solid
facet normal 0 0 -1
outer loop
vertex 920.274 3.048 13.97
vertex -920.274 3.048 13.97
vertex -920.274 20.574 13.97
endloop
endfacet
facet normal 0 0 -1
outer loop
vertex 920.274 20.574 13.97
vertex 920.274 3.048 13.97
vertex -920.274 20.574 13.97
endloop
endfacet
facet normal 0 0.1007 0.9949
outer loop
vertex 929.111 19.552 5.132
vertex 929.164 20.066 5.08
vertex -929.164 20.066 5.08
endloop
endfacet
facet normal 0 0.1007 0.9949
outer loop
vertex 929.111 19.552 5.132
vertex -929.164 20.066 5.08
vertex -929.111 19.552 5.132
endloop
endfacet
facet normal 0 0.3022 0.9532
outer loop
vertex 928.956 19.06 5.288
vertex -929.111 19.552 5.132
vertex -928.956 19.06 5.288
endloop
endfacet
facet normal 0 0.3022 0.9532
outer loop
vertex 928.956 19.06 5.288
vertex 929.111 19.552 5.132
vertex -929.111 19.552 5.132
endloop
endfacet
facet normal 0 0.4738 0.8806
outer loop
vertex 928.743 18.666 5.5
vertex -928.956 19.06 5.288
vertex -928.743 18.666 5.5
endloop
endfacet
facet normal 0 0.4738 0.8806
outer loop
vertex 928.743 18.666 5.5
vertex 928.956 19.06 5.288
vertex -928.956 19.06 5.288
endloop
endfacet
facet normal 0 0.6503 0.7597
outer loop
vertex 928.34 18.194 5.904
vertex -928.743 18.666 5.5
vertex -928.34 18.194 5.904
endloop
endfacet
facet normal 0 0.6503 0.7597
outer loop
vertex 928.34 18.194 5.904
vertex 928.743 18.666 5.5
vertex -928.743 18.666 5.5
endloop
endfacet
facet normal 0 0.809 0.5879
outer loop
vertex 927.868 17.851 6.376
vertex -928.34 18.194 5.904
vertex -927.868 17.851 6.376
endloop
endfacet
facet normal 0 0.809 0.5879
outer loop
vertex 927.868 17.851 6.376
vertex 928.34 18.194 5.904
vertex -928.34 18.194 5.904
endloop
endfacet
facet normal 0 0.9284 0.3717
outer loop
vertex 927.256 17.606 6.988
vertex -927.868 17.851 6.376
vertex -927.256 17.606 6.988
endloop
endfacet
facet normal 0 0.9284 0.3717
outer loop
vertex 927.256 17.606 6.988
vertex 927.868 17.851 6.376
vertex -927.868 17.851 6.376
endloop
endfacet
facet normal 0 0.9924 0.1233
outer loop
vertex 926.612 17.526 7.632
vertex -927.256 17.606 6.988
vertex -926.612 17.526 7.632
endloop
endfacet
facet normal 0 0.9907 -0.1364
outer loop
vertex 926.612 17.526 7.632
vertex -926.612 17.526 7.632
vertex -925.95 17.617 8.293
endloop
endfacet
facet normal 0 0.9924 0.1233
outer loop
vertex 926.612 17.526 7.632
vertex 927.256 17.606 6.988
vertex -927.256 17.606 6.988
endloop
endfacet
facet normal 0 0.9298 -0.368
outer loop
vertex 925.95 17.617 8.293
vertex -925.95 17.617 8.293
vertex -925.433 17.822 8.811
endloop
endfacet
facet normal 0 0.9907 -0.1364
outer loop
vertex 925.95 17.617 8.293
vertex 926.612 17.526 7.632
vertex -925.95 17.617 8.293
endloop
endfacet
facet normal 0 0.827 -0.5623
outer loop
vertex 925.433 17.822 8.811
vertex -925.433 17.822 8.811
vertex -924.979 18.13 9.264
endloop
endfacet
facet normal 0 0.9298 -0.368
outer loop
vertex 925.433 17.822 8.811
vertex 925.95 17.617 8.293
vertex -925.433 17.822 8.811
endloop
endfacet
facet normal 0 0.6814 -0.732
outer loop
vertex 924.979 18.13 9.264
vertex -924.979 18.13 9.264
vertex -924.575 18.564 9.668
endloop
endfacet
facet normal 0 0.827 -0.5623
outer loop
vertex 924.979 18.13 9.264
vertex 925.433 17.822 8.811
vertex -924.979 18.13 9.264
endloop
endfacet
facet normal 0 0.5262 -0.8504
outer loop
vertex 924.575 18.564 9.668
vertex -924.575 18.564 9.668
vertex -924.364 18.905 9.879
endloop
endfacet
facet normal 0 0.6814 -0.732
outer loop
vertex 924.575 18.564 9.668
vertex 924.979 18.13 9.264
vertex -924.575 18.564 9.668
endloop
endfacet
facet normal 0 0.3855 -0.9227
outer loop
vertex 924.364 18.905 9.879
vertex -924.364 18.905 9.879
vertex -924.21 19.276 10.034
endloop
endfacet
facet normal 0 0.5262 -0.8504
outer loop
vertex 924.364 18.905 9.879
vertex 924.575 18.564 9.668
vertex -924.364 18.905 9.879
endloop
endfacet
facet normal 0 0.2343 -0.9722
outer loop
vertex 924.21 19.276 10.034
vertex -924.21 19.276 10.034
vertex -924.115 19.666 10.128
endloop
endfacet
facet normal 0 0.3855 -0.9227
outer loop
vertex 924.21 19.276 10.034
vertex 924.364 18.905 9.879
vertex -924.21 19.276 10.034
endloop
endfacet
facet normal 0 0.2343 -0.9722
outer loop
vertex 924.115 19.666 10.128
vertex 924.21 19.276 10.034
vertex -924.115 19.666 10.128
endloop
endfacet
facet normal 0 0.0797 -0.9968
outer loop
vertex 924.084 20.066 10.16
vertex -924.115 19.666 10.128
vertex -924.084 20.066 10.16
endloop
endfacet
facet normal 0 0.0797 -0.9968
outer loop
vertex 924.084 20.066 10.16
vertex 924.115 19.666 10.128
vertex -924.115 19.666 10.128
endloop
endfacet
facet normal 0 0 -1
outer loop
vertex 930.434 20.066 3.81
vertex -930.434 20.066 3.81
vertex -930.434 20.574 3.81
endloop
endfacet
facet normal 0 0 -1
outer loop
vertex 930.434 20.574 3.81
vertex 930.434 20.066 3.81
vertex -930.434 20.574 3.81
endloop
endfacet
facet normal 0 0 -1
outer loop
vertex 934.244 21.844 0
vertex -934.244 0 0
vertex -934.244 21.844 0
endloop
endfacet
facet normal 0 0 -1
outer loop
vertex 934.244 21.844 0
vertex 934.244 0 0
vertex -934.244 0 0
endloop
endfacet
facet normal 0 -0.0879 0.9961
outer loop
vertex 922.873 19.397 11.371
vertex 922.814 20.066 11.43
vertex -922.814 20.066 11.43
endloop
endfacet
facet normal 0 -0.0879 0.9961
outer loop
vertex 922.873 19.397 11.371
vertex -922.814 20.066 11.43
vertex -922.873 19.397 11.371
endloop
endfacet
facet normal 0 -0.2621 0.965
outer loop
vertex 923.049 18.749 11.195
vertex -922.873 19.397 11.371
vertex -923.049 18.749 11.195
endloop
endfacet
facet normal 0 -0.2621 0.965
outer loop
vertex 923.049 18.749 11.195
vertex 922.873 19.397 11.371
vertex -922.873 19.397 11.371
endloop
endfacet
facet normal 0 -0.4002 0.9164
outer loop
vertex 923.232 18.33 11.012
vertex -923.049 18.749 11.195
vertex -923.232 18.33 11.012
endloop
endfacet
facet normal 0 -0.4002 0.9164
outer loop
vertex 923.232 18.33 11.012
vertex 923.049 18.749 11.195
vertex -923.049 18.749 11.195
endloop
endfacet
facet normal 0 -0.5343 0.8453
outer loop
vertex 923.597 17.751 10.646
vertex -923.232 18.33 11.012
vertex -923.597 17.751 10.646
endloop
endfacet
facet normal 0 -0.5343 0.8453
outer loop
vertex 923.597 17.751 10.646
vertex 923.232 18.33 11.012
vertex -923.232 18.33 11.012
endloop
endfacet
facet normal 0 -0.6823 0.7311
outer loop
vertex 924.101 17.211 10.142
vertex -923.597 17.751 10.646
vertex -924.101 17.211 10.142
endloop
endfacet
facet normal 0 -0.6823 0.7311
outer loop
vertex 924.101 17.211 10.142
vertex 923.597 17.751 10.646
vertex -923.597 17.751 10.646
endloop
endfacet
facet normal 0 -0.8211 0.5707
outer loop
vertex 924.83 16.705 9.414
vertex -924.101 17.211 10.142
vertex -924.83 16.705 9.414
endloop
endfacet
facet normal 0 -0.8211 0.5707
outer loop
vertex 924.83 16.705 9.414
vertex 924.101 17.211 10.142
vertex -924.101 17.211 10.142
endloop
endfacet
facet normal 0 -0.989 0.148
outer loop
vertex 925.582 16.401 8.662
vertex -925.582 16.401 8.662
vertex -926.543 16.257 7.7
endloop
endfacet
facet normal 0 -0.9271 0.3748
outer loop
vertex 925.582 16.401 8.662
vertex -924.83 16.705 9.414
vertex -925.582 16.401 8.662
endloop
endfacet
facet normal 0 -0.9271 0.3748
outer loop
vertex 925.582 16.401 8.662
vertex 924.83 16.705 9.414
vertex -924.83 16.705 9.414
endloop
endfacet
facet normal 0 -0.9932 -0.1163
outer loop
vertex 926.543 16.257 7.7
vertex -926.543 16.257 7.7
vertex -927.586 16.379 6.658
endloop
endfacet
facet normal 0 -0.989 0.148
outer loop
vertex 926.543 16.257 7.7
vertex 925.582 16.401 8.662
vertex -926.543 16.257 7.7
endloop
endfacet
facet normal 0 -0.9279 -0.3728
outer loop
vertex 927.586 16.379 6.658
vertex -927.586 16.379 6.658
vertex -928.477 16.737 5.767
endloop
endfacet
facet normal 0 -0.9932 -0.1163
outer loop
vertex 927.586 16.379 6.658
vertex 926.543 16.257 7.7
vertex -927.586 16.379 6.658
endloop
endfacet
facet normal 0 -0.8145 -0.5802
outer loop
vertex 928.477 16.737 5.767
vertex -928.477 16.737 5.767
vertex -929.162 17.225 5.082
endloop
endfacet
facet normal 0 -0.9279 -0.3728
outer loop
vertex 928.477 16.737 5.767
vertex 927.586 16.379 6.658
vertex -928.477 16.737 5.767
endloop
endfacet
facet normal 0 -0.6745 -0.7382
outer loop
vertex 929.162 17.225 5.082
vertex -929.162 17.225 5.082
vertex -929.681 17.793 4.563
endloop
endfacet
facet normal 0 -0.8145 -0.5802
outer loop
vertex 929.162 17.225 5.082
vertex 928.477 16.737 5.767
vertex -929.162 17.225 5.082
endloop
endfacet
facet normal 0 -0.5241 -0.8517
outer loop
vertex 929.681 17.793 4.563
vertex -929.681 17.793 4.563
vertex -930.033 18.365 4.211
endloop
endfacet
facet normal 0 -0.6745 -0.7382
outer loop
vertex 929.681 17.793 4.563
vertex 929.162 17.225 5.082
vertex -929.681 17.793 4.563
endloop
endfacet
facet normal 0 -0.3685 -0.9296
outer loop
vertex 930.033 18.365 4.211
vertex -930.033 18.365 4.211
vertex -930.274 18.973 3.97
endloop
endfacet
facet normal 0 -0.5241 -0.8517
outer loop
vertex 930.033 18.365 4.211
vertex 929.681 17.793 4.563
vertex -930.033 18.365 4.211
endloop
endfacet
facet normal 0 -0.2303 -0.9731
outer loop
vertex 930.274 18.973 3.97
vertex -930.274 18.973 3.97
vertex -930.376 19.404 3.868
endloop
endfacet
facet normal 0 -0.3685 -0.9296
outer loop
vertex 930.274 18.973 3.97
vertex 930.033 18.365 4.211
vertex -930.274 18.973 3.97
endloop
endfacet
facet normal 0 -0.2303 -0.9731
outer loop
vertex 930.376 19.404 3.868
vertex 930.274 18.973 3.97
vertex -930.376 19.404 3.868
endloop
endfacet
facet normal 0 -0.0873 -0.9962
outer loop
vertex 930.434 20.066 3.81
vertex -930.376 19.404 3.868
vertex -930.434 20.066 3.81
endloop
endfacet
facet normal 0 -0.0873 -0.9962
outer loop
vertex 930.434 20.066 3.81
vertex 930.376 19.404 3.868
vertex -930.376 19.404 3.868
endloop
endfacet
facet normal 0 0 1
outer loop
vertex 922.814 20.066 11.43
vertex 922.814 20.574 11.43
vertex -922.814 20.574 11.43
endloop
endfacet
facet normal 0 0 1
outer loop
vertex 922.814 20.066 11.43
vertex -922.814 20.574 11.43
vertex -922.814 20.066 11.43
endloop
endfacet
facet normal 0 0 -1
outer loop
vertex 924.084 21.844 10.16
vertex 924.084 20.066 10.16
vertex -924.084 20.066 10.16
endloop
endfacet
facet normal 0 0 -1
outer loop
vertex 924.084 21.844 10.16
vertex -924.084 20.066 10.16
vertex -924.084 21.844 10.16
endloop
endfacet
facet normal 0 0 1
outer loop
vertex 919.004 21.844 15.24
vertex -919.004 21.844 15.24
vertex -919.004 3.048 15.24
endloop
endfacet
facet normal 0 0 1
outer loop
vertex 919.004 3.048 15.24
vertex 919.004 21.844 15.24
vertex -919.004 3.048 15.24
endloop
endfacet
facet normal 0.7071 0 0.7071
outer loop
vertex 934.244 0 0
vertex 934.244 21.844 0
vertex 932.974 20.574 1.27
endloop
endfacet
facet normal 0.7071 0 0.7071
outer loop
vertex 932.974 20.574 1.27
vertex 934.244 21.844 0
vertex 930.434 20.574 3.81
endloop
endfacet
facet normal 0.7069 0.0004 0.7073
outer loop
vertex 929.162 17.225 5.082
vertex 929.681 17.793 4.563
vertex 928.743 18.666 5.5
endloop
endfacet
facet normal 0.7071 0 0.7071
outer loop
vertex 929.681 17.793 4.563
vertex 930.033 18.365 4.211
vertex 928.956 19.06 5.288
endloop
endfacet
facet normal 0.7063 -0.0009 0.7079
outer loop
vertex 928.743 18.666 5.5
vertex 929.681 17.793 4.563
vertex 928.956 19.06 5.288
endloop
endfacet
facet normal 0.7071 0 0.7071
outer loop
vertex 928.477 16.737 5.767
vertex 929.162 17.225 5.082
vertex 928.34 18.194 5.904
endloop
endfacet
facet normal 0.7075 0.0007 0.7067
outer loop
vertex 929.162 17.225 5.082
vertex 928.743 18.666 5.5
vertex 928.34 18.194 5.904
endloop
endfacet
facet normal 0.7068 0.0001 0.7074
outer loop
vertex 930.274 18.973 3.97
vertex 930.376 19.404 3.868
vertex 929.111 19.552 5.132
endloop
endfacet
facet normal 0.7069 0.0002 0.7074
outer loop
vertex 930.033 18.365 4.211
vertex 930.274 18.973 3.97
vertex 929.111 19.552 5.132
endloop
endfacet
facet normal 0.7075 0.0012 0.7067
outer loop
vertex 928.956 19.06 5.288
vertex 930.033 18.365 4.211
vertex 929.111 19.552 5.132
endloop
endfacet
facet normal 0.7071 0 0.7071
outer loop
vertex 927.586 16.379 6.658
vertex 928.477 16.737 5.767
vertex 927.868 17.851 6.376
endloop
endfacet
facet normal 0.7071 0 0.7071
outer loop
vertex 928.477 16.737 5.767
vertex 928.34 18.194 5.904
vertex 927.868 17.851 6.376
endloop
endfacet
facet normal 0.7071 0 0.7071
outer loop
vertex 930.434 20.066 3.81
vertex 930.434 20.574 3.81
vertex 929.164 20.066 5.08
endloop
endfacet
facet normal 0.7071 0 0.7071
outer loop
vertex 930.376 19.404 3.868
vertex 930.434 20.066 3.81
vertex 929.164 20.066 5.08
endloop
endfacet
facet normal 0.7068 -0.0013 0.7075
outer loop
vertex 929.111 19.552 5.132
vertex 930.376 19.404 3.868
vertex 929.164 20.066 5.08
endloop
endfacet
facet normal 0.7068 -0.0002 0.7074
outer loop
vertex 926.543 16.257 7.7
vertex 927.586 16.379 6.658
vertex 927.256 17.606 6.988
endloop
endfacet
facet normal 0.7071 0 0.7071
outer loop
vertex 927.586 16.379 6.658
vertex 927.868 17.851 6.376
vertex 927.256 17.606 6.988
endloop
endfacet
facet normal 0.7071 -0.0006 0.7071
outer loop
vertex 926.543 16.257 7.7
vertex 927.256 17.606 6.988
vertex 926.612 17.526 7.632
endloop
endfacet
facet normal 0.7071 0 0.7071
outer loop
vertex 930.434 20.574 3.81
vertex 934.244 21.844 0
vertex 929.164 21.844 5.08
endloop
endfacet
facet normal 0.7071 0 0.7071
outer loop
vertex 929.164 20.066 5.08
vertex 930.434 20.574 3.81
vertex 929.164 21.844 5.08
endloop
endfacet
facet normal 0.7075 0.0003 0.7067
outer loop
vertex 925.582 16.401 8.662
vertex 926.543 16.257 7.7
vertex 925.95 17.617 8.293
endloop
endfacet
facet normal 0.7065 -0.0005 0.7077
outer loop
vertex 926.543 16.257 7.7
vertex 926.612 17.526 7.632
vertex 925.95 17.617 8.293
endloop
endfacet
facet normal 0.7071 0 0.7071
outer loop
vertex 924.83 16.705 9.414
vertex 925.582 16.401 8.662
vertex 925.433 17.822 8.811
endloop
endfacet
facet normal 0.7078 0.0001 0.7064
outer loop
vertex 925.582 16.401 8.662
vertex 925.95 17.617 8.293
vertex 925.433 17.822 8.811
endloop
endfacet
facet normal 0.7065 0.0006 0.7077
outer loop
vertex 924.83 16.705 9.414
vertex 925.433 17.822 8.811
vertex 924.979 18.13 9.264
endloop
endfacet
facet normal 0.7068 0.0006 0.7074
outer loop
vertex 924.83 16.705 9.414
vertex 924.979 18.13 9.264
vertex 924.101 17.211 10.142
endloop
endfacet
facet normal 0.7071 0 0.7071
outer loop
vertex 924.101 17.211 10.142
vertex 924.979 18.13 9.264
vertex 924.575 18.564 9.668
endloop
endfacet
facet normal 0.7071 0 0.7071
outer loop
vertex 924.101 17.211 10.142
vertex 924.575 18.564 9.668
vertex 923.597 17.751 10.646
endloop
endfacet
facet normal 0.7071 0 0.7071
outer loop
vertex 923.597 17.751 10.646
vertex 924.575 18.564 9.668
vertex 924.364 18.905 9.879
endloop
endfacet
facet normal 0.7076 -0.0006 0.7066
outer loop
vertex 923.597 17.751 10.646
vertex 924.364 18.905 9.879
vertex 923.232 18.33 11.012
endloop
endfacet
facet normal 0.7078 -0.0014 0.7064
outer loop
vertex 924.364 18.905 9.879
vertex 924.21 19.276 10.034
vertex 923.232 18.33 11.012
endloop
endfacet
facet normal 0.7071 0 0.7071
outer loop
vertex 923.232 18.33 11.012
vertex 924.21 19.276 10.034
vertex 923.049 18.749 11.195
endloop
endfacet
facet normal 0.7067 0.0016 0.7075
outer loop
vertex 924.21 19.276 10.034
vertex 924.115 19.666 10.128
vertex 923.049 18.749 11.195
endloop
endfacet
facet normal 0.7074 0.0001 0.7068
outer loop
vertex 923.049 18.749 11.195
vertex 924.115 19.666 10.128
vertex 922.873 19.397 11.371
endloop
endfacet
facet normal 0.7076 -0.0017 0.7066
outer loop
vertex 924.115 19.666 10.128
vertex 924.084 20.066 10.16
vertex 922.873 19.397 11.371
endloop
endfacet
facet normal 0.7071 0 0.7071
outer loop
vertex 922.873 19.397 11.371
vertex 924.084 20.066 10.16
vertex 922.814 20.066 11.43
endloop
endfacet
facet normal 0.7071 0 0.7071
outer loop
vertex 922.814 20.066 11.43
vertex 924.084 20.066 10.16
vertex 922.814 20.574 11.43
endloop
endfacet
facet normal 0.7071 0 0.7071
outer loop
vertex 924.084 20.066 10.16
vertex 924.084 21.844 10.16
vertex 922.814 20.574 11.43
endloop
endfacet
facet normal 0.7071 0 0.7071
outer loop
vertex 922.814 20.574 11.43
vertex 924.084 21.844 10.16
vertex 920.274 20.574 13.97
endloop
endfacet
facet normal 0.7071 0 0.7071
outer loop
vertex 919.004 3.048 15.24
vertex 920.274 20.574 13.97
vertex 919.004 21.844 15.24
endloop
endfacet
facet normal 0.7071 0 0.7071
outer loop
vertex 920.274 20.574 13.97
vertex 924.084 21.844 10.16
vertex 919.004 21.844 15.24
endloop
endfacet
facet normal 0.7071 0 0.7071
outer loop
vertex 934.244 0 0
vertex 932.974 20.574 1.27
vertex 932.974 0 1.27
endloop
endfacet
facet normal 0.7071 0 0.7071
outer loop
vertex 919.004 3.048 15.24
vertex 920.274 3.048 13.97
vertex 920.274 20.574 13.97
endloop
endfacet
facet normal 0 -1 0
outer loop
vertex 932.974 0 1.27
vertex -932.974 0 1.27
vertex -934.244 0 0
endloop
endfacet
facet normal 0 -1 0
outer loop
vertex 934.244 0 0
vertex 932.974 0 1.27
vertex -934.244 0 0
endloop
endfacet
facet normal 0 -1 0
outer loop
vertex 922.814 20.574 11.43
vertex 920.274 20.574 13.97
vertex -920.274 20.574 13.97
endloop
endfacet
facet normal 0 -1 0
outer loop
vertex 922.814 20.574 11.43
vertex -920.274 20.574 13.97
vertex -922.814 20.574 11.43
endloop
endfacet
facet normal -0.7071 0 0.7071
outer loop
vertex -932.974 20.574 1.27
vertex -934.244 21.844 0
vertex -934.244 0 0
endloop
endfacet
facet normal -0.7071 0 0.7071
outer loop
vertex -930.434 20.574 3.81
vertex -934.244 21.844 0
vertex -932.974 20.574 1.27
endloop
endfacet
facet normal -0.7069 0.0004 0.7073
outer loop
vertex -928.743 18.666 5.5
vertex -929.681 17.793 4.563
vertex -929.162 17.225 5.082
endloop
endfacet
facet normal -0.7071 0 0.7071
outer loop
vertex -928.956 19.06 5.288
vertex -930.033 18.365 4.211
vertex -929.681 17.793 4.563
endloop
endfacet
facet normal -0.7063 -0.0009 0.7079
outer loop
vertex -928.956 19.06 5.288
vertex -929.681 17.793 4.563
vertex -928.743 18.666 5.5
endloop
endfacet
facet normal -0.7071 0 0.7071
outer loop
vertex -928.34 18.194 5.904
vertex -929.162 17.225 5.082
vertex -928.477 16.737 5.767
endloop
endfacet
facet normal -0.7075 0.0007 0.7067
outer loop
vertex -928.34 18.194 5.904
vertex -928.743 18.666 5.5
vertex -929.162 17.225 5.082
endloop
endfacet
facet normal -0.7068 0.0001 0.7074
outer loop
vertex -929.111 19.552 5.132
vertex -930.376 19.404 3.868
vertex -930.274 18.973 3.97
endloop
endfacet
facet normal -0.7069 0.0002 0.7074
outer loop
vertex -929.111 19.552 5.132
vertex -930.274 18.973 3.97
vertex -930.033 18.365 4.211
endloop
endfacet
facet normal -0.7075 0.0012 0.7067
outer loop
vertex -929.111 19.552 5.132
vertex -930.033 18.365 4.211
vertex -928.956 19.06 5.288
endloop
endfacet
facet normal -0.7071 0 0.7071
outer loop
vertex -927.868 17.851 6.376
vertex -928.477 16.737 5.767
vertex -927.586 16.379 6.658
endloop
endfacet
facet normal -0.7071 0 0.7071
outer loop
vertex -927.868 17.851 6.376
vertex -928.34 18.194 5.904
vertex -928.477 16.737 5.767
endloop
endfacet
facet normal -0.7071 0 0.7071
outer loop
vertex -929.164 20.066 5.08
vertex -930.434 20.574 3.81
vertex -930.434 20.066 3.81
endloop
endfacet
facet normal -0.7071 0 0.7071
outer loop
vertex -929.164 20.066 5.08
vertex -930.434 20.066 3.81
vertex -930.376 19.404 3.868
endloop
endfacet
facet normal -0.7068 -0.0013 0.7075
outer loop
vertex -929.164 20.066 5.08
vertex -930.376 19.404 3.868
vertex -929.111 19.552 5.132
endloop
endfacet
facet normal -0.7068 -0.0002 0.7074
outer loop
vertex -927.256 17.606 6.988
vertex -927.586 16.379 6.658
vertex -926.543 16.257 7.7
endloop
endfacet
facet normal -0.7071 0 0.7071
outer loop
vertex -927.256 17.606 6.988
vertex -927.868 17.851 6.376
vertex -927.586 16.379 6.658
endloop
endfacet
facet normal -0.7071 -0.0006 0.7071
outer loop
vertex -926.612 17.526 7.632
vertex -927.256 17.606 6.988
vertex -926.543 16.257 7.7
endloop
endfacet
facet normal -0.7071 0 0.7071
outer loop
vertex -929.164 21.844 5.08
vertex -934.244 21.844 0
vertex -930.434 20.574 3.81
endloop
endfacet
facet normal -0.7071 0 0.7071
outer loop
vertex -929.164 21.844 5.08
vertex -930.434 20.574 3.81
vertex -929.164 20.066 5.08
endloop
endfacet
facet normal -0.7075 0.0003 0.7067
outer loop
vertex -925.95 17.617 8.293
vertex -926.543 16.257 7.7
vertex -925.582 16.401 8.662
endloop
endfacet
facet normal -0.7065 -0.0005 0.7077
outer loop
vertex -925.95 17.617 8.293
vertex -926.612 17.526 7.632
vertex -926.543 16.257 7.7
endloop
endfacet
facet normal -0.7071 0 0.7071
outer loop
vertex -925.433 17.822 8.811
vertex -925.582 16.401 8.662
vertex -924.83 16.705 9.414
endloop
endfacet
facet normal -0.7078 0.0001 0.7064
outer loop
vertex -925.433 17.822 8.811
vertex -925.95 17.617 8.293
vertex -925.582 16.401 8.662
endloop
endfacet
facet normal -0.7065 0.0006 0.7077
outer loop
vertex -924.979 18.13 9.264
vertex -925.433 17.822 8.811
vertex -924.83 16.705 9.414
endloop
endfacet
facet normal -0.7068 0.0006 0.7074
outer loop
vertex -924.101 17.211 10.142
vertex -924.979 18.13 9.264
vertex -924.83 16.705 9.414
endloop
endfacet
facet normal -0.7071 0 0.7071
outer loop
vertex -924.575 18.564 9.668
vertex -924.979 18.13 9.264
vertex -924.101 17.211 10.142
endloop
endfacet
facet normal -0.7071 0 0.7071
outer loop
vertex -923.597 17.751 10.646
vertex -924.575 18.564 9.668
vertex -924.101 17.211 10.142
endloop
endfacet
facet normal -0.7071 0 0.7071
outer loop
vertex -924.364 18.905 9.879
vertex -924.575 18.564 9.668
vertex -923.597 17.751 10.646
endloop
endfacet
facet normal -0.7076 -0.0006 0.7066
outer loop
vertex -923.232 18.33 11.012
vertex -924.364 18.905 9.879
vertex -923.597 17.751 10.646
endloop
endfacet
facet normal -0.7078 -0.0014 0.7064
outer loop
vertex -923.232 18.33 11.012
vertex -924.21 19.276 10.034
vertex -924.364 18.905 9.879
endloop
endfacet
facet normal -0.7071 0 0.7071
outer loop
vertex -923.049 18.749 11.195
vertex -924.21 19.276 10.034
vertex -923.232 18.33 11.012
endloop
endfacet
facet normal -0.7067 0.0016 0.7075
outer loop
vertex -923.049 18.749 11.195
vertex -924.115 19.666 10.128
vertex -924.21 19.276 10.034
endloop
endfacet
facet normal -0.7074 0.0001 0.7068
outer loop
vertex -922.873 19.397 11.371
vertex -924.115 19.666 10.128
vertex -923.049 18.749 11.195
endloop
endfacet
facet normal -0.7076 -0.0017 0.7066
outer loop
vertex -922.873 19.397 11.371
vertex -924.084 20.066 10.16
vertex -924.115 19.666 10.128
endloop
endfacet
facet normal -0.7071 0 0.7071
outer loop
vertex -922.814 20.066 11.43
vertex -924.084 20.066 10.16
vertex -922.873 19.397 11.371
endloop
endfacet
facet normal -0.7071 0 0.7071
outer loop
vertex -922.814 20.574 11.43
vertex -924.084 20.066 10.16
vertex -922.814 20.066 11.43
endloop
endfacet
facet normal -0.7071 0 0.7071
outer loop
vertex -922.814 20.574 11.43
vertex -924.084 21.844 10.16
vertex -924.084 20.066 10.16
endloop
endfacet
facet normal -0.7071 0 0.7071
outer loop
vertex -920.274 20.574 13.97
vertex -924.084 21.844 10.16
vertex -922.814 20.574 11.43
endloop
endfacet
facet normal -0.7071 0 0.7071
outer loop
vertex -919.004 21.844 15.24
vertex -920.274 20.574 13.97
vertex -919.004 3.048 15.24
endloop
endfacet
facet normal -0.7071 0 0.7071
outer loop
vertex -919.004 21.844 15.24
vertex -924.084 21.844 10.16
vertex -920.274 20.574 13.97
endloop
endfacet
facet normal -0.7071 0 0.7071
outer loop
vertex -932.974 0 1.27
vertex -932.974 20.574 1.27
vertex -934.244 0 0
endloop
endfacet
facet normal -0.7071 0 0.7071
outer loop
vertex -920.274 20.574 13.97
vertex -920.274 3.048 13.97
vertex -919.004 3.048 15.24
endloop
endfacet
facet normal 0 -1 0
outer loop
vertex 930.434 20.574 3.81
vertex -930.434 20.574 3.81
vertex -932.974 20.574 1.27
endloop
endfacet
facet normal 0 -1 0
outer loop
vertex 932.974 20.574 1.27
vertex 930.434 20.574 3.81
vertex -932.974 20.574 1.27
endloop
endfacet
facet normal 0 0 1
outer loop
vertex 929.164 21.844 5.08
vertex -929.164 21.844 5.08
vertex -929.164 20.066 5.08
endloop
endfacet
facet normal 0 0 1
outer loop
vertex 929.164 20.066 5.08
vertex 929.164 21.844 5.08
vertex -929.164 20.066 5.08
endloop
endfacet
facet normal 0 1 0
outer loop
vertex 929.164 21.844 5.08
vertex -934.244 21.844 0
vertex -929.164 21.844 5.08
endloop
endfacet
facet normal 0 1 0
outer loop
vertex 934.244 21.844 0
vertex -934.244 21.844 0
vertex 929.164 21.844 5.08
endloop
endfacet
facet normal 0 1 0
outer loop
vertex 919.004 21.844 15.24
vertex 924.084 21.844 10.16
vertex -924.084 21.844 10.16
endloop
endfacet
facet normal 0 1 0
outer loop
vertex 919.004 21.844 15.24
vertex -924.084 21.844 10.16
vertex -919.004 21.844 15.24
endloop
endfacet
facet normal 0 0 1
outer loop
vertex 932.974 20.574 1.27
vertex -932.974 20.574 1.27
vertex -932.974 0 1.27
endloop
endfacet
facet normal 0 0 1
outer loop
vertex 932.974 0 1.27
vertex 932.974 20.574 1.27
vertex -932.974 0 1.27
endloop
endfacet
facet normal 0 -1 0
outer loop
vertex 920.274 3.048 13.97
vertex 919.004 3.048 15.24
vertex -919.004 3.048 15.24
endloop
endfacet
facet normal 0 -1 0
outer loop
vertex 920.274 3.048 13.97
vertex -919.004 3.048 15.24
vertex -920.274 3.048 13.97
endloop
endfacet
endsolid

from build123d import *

# Parameters (mm, degrees)
BOSS_EXTRUDE1_DEPTH       = 934.24375
CUT_TOP_RIGHT_FRONT_DEPTH = 22.844
CUT_TOP_LEFT_FRONT_DEPTH  = 22.844


with BuildPart() as part:
    # Sketch1 → Boss-Extrude1 (new body, symmetric)
    with BuildSketch(Plane(origin=(0, 0, 0), x_dir=(0, 0, -1), z_dir=(1, 0, 0))):
        with BuildLine():
            Line((0, 0), (0, 21.844))
            Line((0, 21.844), (-5.08, 21.844))
            Line((-5.08, 21.844), (-5.08, 20.066))
            ThreePointArc((-5.08, 20.066), (-7.62, 17.526), (-10.16, 20.066))
            Line((-10.16, 20.066), (-10.16, 21.844))
            Line((-10.16, 21.844), (-15.24, 21.844))
            Line((-15.24, 21.844), (-15.24, 3.048))
            Line((-15.24, 3.048), (-13.97, 3.048))
            Line((-13.97, 3.048), (-13.97, 20.574))
            Line((-13.97, 20.574), (-11.43, 20.574))
            Line((-11.43, 20.574), (-11.43, 20.066))
            ThreePointArc((-11.43, 20.066), (-7.62, 16.256), (-3.81, 20.066))
            Line((-3.81, 20.066), (-3.81, 20.574))
            Line((-3.81, 20.574), (-1.27, 20.574))
            Line((-1.27, 20.574), (-1.27, 0))
            Line((-1.27, 0), (0, 0))
        make_face()
    extrude(amount=BOSS_EXTRUDE1_DEPTH, both=True)

    # Sketch2 → Cut-Top-Right-Front (cut, through all)
    with BuildSketch(Plane(origin=(0, 21.844, 0), x_dir=(1, 0, 0), z_dir=(0, 1, 0))):
        Polygon((934.24375, 0), (919.00375, -15.24), (934.24375, -15.24), align=None)
    extrude(amount=-CUT_TOP_RIGHT_FRONT_DEPTH, mode=Mode.SUBTRACT)

    # Sketch4 → Cut-Top-Left-Front (cut, through all)
    with BuildSketch(Plane(origin=(0, 21.844, 0), x_dir=(1, 0, 0), z_dir=(0, 1, 0))):
        Polygon((-934.24375, 0), (-919.00375, -15.24), (-934.24375, -15.24), align=None)
    extrude(amount=-CUT_TOP_LEFT_FRONT_DEPTH, mode=Mode.SUBTRACT)


solid = part.part
